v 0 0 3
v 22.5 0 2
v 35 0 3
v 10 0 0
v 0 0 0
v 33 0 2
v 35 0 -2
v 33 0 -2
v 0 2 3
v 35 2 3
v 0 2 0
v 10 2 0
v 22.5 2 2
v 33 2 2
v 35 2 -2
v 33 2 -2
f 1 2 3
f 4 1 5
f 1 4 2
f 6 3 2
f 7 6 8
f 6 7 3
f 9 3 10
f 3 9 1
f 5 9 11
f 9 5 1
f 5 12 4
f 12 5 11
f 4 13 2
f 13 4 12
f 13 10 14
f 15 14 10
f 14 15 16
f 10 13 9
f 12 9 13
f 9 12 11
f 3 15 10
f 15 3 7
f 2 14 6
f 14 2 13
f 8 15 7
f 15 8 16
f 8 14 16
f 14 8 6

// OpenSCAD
SpringLoadedLatch();

module SpringLoadedLatch(
	anchorLength		= 10,
	anchorHeight		= 3,
	springLength		= 25,
	springThickness	= 1,
	latchLength		= 2,
	latchHeight		= 4,
	width			= 2
)
{
	anchorSize	= [anchorLength, width, anchorHeight];
	springSize	= [springLength, width, springThickness];
	latchSize	= [latchLength, width, latchHeight];

	translate([0, 0, 0])
		union(){
			hull(){
				cube(anchorSize);
				translate([anchorSize[0], 0, anchorSize[2] - springSize[2]]) 
					cube([springSize[0] * 0.5, springSize[1], springSize[2]]);
			}
			translate([anchorSize[0] + springSize[0] * 0.5, 0, anchorSize[2] - springSize[2]]) 
					cube([springSize[0] * 0.5, springSize[1], springSize[2]]);
			translate([	anchorSize[0] + springSize[0] - latchSize[0], 0, 
						anchorSize[2] - springSize[2] - latchSize[2]]) 
				cube(latchSize);
		}


} // SpringLoadedLatch module
